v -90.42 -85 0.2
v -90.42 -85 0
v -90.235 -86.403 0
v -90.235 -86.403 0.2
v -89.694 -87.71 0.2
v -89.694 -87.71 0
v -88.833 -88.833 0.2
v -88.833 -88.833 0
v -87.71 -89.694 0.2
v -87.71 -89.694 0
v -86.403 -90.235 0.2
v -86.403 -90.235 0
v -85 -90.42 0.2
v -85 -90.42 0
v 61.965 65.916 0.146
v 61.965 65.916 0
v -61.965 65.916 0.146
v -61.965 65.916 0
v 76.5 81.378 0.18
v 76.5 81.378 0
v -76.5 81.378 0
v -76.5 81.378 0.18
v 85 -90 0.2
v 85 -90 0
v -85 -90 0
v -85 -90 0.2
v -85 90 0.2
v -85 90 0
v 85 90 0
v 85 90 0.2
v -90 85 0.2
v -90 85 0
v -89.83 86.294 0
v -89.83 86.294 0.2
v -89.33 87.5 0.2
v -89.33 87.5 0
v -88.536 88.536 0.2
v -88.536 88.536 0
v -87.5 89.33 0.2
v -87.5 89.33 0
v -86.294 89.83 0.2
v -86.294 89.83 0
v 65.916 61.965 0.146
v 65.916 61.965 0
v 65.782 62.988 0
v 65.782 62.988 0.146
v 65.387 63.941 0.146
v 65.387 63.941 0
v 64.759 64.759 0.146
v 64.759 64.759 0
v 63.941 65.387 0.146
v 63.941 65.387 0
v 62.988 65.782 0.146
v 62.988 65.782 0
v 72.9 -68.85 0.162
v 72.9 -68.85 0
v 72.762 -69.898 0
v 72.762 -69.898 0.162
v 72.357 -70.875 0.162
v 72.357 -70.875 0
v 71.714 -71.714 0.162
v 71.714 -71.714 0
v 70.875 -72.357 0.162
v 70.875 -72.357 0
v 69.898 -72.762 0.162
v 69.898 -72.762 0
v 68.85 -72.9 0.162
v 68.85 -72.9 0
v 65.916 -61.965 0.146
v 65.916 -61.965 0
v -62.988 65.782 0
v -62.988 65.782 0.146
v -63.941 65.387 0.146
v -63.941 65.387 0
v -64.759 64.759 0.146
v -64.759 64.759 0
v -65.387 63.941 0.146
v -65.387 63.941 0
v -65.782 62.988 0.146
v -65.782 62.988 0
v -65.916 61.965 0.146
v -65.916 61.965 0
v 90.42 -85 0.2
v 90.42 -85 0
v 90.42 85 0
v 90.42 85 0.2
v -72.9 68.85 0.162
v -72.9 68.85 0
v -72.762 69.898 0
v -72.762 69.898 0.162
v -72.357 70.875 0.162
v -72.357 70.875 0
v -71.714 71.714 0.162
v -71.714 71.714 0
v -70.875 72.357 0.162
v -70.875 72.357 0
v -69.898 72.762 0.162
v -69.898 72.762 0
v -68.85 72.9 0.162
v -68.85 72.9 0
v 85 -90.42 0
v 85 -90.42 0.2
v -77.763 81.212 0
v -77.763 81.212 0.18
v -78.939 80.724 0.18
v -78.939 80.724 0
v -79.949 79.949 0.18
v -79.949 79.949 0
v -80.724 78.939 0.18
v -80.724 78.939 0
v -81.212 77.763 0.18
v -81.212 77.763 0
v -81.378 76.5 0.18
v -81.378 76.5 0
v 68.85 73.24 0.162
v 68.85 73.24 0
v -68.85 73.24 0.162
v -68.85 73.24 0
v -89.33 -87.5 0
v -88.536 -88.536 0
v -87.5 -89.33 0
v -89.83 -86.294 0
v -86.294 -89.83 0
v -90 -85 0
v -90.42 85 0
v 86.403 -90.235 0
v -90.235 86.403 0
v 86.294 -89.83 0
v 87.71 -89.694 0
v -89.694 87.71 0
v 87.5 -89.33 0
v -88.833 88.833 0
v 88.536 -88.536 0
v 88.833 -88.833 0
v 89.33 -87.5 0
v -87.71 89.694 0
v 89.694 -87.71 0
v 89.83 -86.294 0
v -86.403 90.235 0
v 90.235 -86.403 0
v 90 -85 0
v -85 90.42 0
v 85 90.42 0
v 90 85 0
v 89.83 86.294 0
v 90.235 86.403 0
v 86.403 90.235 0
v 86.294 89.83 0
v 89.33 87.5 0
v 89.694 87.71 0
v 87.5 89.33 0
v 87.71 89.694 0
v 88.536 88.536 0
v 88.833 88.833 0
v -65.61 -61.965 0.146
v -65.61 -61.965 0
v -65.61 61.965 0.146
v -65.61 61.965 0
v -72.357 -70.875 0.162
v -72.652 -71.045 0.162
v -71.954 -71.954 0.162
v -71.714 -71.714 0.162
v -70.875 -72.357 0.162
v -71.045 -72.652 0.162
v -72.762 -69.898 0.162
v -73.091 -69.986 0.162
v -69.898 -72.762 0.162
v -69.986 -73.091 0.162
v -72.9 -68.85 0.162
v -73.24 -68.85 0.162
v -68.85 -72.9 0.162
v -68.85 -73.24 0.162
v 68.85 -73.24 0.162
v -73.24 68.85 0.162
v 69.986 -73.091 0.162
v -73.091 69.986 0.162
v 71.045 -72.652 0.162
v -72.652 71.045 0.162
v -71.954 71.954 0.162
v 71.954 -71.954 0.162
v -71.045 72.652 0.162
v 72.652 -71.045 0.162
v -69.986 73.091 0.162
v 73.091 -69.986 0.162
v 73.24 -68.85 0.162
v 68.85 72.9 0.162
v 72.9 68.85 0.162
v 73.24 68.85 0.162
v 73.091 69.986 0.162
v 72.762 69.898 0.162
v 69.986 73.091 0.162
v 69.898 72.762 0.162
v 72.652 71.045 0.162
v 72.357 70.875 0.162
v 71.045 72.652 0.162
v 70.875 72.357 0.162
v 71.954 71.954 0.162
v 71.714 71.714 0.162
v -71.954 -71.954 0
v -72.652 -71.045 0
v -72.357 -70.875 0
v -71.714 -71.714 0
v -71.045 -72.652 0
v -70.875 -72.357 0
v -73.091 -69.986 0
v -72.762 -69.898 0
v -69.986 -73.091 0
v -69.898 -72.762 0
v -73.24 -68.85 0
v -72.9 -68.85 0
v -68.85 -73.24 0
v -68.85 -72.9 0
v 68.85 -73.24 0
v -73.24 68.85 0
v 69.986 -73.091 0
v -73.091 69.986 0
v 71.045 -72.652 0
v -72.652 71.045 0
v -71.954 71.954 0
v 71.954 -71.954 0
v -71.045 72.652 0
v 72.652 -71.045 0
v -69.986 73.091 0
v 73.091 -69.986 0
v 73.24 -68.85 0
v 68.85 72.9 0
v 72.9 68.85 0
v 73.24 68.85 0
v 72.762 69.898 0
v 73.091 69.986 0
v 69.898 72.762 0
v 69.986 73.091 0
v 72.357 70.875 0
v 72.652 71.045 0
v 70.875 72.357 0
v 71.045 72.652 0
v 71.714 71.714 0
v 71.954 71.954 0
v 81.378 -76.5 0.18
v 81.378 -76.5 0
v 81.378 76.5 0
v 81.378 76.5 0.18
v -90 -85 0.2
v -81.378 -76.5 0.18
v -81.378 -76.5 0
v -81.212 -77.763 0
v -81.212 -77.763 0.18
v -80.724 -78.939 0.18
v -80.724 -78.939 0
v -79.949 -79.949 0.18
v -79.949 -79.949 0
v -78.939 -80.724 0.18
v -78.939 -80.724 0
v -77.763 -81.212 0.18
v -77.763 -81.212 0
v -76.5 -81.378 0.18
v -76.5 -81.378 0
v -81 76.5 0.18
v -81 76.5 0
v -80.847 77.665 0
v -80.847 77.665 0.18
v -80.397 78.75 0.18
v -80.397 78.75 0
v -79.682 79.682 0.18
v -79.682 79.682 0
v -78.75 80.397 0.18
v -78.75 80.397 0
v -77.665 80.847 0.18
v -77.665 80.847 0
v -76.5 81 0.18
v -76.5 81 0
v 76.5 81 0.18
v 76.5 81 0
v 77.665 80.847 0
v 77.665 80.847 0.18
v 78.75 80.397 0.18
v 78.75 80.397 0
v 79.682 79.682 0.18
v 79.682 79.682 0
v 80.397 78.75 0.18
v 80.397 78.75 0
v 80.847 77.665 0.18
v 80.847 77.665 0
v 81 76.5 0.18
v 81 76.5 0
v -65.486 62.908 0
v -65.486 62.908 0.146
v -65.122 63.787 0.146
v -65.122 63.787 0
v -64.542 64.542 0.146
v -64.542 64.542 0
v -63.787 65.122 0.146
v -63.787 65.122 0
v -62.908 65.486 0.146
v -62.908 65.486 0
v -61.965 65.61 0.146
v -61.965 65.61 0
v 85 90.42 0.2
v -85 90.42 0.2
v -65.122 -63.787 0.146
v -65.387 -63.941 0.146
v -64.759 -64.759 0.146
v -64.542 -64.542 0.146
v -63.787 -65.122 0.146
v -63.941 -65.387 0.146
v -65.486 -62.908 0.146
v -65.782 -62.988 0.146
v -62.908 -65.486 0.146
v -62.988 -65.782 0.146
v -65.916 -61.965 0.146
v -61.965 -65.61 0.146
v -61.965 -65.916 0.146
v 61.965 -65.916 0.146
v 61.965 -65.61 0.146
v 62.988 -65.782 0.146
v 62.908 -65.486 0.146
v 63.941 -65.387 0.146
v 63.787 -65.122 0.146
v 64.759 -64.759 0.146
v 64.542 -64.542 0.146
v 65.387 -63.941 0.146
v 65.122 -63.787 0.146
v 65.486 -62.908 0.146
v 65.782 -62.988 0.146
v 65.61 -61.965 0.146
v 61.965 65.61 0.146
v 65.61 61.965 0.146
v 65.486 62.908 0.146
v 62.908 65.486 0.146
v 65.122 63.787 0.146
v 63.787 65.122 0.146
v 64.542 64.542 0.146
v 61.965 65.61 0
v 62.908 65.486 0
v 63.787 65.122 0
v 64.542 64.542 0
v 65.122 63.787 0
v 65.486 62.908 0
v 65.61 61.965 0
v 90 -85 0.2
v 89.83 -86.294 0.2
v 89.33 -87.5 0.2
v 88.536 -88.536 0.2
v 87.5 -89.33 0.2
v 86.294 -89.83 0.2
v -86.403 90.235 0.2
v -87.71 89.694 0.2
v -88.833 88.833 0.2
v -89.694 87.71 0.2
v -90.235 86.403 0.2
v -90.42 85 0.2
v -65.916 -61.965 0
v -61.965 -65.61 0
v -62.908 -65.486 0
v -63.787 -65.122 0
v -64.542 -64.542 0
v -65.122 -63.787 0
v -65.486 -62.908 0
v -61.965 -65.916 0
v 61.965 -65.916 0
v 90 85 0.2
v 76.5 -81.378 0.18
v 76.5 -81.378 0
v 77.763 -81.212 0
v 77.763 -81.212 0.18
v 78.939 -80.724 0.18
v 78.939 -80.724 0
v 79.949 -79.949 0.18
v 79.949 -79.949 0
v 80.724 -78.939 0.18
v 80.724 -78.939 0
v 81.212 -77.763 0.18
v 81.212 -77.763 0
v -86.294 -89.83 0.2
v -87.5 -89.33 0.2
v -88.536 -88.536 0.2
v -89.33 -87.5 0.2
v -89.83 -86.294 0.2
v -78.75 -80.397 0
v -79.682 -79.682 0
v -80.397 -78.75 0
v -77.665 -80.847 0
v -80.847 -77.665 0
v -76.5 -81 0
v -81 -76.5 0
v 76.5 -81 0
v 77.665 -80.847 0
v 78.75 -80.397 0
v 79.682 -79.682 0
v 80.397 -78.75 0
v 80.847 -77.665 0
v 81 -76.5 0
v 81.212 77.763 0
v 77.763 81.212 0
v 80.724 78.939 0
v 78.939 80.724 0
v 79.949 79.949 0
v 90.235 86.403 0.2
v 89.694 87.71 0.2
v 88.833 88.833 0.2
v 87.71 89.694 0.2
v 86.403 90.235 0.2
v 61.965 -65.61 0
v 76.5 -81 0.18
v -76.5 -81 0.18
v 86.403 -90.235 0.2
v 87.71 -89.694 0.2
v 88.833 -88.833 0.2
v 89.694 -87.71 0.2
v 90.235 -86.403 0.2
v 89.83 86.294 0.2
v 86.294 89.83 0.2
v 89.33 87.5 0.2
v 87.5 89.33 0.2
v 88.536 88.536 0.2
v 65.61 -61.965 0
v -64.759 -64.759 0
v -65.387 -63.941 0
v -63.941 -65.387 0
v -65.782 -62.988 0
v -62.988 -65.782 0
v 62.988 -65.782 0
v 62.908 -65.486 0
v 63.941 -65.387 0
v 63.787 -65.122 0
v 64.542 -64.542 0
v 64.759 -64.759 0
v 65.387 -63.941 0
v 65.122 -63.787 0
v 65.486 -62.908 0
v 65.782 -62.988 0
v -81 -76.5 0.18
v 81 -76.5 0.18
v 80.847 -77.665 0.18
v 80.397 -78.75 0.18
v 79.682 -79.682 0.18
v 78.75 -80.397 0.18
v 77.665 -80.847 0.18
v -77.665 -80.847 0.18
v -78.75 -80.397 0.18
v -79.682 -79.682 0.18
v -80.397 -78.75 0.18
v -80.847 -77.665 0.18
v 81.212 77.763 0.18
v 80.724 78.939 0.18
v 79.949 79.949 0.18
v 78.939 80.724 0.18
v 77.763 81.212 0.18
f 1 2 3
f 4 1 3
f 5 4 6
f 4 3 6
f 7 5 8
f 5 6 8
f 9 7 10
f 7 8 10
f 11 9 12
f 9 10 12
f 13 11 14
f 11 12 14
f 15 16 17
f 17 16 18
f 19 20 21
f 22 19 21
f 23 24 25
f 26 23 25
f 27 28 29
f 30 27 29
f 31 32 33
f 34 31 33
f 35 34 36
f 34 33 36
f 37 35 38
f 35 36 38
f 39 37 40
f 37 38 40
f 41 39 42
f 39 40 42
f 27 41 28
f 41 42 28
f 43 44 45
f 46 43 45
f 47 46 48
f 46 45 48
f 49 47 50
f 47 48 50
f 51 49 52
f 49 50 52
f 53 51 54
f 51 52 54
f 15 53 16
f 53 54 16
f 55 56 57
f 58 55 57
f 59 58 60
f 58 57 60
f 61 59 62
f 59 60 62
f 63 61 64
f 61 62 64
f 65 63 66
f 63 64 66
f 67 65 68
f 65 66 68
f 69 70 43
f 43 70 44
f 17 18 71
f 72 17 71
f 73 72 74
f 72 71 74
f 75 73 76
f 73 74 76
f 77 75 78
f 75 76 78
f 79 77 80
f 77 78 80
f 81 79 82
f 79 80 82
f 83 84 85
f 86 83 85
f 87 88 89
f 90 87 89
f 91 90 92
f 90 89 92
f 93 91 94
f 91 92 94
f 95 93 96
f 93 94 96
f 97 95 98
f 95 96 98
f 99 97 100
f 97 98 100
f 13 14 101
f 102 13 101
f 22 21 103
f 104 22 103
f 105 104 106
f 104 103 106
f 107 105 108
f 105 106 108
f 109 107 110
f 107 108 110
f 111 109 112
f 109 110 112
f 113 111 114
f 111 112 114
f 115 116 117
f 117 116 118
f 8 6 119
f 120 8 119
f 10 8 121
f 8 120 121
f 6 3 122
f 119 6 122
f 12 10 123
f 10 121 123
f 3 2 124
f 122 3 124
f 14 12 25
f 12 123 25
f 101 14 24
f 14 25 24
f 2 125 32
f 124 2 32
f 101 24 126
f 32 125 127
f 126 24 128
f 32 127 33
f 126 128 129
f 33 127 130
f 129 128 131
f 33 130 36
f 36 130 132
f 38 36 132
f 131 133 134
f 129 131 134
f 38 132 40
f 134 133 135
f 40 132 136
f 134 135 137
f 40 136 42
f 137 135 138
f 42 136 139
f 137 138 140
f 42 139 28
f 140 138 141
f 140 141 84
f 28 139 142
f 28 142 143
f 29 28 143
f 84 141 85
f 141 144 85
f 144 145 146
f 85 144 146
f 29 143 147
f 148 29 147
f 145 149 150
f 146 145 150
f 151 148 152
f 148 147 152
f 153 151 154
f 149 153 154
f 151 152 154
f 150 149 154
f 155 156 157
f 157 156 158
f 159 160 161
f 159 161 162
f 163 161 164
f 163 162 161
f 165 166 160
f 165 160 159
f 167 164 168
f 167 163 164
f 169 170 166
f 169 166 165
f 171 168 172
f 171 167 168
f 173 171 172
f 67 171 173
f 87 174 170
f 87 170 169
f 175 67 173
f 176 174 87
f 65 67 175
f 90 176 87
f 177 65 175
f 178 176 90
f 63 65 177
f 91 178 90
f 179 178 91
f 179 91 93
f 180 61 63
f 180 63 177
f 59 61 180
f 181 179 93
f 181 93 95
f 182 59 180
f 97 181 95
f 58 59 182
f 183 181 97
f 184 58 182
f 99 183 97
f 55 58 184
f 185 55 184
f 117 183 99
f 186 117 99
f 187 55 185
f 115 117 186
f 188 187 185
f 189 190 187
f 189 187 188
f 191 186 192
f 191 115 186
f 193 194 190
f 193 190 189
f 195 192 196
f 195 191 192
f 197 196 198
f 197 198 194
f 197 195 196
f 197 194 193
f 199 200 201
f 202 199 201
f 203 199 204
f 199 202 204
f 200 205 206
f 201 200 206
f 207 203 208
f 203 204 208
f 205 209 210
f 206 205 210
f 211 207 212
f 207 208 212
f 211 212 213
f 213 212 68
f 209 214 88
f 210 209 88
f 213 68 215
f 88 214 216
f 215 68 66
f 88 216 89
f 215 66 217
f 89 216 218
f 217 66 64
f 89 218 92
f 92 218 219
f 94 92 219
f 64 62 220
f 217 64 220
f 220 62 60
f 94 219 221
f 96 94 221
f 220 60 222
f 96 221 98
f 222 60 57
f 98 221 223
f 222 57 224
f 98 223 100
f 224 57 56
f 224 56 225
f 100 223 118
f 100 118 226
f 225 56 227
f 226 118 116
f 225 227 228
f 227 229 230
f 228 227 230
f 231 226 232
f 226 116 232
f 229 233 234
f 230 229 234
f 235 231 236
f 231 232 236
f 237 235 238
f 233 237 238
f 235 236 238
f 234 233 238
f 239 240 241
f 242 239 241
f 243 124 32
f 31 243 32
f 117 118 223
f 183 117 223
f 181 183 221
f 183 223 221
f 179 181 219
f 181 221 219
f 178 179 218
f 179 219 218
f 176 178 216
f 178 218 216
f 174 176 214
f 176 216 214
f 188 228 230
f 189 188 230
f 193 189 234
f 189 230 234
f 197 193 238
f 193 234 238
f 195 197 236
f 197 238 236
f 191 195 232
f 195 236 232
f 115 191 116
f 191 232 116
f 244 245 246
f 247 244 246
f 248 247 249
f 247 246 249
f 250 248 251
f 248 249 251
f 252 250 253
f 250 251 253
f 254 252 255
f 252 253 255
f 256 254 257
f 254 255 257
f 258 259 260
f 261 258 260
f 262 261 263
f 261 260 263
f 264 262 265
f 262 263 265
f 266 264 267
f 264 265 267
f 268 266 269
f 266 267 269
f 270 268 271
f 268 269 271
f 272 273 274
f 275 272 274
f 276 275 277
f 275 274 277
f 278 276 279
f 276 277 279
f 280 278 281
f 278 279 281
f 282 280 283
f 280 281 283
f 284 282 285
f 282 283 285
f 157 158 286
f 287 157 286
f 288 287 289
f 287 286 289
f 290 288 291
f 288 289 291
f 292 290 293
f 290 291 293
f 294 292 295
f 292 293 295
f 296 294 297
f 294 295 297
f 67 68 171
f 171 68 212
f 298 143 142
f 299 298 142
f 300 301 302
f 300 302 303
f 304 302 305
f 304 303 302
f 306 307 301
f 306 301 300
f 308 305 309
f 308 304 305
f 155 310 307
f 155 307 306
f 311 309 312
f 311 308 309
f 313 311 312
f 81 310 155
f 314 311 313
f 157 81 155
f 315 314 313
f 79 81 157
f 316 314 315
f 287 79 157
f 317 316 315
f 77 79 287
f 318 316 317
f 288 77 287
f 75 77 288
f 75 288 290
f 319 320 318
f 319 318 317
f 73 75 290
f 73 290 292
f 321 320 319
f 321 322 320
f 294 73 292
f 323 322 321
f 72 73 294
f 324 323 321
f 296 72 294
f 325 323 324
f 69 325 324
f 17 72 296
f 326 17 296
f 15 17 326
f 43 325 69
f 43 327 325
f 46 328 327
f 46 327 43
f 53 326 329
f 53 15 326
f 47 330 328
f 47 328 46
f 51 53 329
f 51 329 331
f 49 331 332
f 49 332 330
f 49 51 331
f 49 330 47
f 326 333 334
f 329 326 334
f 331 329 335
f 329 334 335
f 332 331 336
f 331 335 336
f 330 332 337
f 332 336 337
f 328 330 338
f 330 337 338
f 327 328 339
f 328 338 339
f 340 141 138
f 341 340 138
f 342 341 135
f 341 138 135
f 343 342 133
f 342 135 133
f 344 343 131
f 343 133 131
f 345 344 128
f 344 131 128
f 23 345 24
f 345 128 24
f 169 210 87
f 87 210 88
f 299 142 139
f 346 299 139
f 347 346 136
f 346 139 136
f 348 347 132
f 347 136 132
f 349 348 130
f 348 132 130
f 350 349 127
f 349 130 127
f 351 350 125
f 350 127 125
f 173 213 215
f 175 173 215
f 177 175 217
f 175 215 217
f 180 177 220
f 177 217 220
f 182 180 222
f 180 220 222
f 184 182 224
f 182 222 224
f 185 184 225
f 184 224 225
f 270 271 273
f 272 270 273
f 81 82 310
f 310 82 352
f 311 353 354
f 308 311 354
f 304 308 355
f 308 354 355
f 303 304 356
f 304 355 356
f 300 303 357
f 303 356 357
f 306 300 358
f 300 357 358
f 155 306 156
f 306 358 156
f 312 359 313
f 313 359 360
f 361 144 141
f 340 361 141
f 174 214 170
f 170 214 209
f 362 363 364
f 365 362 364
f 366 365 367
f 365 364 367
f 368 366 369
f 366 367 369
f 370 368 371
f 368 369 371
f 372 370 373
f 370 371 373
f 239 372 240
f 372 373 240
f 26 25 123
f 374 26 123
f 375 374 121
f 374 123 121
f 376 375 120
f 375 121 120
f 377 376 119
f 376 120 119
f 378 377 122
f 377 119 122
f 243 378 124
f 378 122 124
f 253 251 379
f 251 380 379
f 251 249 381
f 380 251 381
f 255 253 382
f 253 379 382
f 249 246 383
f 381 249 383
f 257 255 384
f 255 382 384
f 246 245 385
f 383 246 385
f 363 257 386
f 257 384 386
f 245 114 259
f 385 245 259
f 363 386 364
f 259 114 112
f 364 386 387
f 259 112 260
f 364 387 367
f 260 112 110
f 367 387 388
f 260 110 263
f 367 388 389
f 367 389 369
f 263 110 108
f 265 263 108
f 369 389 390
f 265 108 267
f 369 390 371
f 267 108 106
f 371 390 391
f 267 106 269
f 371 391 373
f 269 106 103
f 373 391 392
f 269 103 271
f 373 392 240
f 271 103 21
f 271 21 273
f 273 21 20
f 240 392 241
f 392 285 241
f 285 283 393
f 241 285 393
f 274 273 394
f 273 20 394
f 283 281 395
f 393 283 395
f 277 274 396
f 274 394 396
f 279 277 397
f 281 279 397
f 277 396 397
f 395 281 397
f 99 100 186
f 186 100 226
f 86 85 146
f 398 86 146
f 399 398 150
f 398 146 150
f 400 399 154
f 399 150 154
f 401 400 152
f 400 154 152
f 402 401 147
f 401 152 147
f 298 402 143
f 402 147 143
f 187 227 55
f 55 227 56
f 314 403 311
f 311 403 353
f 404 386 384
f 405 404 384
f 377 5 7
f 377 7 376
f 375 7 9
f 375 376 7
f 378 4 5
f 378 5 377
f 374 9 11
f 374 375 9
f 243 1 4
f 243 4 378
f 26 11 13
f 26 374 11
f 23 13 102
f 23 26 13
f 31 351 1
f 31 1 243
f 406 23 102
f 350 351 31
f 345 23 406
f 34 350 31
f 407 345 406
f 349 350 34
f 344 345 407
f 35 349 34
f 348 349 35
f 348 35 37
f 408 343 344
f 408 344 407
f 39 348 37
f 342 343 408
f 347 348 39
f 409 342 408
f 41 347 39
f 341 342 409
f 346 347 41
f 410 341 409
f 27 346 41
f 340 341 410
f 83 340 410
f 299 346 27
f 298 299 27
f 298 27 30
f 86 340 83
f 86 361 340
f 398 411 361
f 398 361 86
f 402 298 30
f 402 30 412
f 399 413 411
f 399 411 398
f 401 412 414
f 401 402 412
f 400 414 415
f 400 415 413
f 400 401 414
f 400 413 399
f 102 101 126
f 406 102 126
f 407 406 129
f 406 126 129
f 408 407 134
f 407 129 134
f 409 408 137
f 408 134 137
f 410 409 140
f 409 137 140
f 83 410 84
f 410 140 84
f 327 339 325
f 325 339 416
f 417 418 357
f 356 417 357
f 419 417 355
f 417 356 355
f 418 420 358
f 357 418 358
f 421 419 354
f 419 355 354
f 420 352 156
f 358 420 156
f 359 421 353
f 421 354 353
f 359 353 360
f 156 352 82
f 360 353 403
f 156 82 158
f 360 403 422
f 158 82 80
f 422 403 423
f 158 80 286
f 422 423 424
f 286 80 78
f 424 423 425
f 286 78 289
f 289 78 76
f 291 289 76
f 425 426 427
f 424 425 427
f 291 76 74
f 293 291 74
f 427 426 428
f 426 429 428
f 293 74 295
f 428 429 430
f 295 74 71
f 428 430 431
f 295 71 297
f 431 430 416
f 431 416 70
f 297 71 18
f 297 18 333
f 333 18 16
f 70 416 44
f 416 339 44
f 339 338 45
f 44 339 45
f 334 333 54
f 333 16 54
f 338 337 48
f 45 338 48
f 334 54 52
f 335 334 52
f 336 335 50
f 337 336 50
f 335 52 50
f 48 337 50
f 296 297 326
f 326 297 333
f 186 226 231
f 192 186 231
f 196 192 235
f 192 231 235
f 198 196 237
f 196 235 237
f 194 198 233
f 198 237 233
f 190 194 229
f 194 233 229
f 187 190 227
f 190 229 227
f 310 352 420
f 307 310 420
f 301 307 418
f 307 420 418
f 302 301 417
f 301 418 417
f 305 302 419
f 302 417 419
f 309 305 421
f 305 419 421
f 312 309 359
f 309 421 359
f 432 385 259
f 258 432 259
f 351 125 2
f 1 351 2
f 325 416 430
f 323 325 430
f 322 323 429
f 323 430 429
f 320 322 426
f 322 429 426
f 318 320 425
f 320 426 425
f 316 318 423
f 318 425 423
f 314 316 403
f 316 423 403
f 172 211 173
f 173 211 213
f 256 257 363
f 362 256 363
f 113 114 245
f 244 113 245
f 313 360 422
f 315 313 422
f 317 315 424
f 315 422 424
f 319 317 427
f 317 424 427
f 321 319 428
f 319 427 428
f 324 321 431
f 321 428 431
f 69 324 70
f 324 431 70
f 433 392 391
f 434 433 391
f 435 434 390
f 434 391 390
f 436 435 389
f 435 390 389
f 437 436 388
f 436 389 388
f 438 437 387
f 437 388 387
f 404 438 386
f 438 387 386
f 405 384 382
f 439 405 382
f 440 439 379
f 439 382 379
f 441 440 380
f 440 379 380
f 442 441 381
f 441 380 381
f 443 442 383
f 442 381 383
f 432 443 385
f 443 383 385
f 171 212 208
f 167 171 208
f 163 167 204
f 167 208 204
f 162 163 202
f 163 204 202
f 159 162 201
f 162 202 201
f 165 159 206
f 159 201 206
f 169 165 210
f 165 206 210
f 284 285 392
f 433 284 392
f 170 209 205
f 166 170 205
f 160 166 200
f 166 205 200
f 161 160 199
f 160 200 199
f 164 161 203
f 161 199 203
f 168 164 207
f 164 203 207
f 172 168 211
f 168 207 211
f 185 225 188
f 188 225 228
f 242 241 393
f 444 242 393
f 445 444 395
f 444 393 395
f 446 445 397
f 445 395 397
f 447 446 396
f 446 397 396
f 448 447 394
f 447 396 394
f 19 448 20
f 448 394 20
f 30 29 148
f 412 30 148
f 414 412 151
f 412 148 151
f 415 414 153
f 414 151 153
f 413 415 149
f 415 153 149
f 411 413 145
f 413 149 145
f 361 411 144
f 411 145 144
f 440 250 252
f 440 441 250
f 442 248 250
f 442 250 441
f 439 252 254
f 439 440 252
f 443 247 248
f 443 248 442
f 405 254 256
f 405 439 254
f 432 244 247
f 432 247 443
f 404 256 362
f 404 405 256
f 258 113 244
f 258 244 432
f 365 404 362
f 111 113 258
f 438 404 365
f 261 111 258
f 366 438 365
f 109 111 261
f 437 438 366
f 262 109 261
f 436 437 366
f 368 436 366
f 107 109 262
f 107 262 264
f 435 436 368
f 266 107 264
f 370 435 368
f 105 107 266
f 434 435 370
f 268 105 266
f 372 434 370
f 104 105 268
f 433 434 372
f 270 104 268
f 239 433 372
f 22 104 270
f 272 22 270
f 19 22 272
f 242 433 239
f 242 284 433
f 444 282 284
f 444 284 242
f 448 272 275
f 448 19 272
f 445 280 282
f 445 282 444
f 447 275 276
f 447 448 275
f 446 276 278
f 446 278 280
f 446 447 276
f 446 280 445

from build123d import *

# Parameters (mm, degrees)
F1_DEPTH = 0.2
F2_SCALE = 0.9
F3_SCALE = 0.9
F4_SCALE = 0.9


with BuildPart() as f1:
    # F0 (on Top) → F1 (new body)
    with BuildSketch(Plane.XY):
        with BuildLine():
            Line((90.42, -85), (90.42, 85))
            ThreePointArc((90.42, 85), (88.832518754, 88.832518754), (85, 90.42))
            Line((85, 90.42), (-85, 90.42))
            ThreePointArc((-85, 90.42), (-88.832518754, 88.832518754), (-90.42, 85))
            Line((-90.42, 85), (-90.42, -85))
            ThreePointArc((-90.42, -85), (-88.832518754, -88.832518754), (-85, -90.42))
            Line((-85, -90.42), (85, -90.42))
            ThreePointArc((85, -90.42), (88.832518754, -88.832518754), (90.42, -85))
        make_face()
        with BuildLine():
            Line((-85, 90), (85, 90))
            ThreePointArc((85, 90), (88.5355339059, 88.5355339059), (90, 85))
            Line((90, 85), (90, -85))
            ThreePointArc((90, -85), (88.5355339059, -88.5355339059), (85, -90))
            Line((85, -90), (-85, -90))
            ThreePointArc((-85, -90), (-88.5355339059, -88.5355339059), (-90, -85))
            Line((-90, -85), (-90, 85))
            ThreePointArc((-90, 85), (-88.5355339059, 88.5355339059), (-85, 90))
        make_face(mode=Mode.SUBTRACT)
    extrude(amount=F1_DEPTH)


with BuildPart() as f2_1:
    # F2: copy of F1
    add(f1.part.scale(F2_SCALE))


with BuildPart() as f3_1:
    # F3: copy of F2_1
    add(f2_1.part.scale(F3_SCALE))


with BuildPart() as f4_1:
    # F4: copy of F3_1
    add(f3_1.part.scale(F4_SCALE))


solid = Compound([f1.part, f2_1.part, f3_1.part, f4_1.part])
